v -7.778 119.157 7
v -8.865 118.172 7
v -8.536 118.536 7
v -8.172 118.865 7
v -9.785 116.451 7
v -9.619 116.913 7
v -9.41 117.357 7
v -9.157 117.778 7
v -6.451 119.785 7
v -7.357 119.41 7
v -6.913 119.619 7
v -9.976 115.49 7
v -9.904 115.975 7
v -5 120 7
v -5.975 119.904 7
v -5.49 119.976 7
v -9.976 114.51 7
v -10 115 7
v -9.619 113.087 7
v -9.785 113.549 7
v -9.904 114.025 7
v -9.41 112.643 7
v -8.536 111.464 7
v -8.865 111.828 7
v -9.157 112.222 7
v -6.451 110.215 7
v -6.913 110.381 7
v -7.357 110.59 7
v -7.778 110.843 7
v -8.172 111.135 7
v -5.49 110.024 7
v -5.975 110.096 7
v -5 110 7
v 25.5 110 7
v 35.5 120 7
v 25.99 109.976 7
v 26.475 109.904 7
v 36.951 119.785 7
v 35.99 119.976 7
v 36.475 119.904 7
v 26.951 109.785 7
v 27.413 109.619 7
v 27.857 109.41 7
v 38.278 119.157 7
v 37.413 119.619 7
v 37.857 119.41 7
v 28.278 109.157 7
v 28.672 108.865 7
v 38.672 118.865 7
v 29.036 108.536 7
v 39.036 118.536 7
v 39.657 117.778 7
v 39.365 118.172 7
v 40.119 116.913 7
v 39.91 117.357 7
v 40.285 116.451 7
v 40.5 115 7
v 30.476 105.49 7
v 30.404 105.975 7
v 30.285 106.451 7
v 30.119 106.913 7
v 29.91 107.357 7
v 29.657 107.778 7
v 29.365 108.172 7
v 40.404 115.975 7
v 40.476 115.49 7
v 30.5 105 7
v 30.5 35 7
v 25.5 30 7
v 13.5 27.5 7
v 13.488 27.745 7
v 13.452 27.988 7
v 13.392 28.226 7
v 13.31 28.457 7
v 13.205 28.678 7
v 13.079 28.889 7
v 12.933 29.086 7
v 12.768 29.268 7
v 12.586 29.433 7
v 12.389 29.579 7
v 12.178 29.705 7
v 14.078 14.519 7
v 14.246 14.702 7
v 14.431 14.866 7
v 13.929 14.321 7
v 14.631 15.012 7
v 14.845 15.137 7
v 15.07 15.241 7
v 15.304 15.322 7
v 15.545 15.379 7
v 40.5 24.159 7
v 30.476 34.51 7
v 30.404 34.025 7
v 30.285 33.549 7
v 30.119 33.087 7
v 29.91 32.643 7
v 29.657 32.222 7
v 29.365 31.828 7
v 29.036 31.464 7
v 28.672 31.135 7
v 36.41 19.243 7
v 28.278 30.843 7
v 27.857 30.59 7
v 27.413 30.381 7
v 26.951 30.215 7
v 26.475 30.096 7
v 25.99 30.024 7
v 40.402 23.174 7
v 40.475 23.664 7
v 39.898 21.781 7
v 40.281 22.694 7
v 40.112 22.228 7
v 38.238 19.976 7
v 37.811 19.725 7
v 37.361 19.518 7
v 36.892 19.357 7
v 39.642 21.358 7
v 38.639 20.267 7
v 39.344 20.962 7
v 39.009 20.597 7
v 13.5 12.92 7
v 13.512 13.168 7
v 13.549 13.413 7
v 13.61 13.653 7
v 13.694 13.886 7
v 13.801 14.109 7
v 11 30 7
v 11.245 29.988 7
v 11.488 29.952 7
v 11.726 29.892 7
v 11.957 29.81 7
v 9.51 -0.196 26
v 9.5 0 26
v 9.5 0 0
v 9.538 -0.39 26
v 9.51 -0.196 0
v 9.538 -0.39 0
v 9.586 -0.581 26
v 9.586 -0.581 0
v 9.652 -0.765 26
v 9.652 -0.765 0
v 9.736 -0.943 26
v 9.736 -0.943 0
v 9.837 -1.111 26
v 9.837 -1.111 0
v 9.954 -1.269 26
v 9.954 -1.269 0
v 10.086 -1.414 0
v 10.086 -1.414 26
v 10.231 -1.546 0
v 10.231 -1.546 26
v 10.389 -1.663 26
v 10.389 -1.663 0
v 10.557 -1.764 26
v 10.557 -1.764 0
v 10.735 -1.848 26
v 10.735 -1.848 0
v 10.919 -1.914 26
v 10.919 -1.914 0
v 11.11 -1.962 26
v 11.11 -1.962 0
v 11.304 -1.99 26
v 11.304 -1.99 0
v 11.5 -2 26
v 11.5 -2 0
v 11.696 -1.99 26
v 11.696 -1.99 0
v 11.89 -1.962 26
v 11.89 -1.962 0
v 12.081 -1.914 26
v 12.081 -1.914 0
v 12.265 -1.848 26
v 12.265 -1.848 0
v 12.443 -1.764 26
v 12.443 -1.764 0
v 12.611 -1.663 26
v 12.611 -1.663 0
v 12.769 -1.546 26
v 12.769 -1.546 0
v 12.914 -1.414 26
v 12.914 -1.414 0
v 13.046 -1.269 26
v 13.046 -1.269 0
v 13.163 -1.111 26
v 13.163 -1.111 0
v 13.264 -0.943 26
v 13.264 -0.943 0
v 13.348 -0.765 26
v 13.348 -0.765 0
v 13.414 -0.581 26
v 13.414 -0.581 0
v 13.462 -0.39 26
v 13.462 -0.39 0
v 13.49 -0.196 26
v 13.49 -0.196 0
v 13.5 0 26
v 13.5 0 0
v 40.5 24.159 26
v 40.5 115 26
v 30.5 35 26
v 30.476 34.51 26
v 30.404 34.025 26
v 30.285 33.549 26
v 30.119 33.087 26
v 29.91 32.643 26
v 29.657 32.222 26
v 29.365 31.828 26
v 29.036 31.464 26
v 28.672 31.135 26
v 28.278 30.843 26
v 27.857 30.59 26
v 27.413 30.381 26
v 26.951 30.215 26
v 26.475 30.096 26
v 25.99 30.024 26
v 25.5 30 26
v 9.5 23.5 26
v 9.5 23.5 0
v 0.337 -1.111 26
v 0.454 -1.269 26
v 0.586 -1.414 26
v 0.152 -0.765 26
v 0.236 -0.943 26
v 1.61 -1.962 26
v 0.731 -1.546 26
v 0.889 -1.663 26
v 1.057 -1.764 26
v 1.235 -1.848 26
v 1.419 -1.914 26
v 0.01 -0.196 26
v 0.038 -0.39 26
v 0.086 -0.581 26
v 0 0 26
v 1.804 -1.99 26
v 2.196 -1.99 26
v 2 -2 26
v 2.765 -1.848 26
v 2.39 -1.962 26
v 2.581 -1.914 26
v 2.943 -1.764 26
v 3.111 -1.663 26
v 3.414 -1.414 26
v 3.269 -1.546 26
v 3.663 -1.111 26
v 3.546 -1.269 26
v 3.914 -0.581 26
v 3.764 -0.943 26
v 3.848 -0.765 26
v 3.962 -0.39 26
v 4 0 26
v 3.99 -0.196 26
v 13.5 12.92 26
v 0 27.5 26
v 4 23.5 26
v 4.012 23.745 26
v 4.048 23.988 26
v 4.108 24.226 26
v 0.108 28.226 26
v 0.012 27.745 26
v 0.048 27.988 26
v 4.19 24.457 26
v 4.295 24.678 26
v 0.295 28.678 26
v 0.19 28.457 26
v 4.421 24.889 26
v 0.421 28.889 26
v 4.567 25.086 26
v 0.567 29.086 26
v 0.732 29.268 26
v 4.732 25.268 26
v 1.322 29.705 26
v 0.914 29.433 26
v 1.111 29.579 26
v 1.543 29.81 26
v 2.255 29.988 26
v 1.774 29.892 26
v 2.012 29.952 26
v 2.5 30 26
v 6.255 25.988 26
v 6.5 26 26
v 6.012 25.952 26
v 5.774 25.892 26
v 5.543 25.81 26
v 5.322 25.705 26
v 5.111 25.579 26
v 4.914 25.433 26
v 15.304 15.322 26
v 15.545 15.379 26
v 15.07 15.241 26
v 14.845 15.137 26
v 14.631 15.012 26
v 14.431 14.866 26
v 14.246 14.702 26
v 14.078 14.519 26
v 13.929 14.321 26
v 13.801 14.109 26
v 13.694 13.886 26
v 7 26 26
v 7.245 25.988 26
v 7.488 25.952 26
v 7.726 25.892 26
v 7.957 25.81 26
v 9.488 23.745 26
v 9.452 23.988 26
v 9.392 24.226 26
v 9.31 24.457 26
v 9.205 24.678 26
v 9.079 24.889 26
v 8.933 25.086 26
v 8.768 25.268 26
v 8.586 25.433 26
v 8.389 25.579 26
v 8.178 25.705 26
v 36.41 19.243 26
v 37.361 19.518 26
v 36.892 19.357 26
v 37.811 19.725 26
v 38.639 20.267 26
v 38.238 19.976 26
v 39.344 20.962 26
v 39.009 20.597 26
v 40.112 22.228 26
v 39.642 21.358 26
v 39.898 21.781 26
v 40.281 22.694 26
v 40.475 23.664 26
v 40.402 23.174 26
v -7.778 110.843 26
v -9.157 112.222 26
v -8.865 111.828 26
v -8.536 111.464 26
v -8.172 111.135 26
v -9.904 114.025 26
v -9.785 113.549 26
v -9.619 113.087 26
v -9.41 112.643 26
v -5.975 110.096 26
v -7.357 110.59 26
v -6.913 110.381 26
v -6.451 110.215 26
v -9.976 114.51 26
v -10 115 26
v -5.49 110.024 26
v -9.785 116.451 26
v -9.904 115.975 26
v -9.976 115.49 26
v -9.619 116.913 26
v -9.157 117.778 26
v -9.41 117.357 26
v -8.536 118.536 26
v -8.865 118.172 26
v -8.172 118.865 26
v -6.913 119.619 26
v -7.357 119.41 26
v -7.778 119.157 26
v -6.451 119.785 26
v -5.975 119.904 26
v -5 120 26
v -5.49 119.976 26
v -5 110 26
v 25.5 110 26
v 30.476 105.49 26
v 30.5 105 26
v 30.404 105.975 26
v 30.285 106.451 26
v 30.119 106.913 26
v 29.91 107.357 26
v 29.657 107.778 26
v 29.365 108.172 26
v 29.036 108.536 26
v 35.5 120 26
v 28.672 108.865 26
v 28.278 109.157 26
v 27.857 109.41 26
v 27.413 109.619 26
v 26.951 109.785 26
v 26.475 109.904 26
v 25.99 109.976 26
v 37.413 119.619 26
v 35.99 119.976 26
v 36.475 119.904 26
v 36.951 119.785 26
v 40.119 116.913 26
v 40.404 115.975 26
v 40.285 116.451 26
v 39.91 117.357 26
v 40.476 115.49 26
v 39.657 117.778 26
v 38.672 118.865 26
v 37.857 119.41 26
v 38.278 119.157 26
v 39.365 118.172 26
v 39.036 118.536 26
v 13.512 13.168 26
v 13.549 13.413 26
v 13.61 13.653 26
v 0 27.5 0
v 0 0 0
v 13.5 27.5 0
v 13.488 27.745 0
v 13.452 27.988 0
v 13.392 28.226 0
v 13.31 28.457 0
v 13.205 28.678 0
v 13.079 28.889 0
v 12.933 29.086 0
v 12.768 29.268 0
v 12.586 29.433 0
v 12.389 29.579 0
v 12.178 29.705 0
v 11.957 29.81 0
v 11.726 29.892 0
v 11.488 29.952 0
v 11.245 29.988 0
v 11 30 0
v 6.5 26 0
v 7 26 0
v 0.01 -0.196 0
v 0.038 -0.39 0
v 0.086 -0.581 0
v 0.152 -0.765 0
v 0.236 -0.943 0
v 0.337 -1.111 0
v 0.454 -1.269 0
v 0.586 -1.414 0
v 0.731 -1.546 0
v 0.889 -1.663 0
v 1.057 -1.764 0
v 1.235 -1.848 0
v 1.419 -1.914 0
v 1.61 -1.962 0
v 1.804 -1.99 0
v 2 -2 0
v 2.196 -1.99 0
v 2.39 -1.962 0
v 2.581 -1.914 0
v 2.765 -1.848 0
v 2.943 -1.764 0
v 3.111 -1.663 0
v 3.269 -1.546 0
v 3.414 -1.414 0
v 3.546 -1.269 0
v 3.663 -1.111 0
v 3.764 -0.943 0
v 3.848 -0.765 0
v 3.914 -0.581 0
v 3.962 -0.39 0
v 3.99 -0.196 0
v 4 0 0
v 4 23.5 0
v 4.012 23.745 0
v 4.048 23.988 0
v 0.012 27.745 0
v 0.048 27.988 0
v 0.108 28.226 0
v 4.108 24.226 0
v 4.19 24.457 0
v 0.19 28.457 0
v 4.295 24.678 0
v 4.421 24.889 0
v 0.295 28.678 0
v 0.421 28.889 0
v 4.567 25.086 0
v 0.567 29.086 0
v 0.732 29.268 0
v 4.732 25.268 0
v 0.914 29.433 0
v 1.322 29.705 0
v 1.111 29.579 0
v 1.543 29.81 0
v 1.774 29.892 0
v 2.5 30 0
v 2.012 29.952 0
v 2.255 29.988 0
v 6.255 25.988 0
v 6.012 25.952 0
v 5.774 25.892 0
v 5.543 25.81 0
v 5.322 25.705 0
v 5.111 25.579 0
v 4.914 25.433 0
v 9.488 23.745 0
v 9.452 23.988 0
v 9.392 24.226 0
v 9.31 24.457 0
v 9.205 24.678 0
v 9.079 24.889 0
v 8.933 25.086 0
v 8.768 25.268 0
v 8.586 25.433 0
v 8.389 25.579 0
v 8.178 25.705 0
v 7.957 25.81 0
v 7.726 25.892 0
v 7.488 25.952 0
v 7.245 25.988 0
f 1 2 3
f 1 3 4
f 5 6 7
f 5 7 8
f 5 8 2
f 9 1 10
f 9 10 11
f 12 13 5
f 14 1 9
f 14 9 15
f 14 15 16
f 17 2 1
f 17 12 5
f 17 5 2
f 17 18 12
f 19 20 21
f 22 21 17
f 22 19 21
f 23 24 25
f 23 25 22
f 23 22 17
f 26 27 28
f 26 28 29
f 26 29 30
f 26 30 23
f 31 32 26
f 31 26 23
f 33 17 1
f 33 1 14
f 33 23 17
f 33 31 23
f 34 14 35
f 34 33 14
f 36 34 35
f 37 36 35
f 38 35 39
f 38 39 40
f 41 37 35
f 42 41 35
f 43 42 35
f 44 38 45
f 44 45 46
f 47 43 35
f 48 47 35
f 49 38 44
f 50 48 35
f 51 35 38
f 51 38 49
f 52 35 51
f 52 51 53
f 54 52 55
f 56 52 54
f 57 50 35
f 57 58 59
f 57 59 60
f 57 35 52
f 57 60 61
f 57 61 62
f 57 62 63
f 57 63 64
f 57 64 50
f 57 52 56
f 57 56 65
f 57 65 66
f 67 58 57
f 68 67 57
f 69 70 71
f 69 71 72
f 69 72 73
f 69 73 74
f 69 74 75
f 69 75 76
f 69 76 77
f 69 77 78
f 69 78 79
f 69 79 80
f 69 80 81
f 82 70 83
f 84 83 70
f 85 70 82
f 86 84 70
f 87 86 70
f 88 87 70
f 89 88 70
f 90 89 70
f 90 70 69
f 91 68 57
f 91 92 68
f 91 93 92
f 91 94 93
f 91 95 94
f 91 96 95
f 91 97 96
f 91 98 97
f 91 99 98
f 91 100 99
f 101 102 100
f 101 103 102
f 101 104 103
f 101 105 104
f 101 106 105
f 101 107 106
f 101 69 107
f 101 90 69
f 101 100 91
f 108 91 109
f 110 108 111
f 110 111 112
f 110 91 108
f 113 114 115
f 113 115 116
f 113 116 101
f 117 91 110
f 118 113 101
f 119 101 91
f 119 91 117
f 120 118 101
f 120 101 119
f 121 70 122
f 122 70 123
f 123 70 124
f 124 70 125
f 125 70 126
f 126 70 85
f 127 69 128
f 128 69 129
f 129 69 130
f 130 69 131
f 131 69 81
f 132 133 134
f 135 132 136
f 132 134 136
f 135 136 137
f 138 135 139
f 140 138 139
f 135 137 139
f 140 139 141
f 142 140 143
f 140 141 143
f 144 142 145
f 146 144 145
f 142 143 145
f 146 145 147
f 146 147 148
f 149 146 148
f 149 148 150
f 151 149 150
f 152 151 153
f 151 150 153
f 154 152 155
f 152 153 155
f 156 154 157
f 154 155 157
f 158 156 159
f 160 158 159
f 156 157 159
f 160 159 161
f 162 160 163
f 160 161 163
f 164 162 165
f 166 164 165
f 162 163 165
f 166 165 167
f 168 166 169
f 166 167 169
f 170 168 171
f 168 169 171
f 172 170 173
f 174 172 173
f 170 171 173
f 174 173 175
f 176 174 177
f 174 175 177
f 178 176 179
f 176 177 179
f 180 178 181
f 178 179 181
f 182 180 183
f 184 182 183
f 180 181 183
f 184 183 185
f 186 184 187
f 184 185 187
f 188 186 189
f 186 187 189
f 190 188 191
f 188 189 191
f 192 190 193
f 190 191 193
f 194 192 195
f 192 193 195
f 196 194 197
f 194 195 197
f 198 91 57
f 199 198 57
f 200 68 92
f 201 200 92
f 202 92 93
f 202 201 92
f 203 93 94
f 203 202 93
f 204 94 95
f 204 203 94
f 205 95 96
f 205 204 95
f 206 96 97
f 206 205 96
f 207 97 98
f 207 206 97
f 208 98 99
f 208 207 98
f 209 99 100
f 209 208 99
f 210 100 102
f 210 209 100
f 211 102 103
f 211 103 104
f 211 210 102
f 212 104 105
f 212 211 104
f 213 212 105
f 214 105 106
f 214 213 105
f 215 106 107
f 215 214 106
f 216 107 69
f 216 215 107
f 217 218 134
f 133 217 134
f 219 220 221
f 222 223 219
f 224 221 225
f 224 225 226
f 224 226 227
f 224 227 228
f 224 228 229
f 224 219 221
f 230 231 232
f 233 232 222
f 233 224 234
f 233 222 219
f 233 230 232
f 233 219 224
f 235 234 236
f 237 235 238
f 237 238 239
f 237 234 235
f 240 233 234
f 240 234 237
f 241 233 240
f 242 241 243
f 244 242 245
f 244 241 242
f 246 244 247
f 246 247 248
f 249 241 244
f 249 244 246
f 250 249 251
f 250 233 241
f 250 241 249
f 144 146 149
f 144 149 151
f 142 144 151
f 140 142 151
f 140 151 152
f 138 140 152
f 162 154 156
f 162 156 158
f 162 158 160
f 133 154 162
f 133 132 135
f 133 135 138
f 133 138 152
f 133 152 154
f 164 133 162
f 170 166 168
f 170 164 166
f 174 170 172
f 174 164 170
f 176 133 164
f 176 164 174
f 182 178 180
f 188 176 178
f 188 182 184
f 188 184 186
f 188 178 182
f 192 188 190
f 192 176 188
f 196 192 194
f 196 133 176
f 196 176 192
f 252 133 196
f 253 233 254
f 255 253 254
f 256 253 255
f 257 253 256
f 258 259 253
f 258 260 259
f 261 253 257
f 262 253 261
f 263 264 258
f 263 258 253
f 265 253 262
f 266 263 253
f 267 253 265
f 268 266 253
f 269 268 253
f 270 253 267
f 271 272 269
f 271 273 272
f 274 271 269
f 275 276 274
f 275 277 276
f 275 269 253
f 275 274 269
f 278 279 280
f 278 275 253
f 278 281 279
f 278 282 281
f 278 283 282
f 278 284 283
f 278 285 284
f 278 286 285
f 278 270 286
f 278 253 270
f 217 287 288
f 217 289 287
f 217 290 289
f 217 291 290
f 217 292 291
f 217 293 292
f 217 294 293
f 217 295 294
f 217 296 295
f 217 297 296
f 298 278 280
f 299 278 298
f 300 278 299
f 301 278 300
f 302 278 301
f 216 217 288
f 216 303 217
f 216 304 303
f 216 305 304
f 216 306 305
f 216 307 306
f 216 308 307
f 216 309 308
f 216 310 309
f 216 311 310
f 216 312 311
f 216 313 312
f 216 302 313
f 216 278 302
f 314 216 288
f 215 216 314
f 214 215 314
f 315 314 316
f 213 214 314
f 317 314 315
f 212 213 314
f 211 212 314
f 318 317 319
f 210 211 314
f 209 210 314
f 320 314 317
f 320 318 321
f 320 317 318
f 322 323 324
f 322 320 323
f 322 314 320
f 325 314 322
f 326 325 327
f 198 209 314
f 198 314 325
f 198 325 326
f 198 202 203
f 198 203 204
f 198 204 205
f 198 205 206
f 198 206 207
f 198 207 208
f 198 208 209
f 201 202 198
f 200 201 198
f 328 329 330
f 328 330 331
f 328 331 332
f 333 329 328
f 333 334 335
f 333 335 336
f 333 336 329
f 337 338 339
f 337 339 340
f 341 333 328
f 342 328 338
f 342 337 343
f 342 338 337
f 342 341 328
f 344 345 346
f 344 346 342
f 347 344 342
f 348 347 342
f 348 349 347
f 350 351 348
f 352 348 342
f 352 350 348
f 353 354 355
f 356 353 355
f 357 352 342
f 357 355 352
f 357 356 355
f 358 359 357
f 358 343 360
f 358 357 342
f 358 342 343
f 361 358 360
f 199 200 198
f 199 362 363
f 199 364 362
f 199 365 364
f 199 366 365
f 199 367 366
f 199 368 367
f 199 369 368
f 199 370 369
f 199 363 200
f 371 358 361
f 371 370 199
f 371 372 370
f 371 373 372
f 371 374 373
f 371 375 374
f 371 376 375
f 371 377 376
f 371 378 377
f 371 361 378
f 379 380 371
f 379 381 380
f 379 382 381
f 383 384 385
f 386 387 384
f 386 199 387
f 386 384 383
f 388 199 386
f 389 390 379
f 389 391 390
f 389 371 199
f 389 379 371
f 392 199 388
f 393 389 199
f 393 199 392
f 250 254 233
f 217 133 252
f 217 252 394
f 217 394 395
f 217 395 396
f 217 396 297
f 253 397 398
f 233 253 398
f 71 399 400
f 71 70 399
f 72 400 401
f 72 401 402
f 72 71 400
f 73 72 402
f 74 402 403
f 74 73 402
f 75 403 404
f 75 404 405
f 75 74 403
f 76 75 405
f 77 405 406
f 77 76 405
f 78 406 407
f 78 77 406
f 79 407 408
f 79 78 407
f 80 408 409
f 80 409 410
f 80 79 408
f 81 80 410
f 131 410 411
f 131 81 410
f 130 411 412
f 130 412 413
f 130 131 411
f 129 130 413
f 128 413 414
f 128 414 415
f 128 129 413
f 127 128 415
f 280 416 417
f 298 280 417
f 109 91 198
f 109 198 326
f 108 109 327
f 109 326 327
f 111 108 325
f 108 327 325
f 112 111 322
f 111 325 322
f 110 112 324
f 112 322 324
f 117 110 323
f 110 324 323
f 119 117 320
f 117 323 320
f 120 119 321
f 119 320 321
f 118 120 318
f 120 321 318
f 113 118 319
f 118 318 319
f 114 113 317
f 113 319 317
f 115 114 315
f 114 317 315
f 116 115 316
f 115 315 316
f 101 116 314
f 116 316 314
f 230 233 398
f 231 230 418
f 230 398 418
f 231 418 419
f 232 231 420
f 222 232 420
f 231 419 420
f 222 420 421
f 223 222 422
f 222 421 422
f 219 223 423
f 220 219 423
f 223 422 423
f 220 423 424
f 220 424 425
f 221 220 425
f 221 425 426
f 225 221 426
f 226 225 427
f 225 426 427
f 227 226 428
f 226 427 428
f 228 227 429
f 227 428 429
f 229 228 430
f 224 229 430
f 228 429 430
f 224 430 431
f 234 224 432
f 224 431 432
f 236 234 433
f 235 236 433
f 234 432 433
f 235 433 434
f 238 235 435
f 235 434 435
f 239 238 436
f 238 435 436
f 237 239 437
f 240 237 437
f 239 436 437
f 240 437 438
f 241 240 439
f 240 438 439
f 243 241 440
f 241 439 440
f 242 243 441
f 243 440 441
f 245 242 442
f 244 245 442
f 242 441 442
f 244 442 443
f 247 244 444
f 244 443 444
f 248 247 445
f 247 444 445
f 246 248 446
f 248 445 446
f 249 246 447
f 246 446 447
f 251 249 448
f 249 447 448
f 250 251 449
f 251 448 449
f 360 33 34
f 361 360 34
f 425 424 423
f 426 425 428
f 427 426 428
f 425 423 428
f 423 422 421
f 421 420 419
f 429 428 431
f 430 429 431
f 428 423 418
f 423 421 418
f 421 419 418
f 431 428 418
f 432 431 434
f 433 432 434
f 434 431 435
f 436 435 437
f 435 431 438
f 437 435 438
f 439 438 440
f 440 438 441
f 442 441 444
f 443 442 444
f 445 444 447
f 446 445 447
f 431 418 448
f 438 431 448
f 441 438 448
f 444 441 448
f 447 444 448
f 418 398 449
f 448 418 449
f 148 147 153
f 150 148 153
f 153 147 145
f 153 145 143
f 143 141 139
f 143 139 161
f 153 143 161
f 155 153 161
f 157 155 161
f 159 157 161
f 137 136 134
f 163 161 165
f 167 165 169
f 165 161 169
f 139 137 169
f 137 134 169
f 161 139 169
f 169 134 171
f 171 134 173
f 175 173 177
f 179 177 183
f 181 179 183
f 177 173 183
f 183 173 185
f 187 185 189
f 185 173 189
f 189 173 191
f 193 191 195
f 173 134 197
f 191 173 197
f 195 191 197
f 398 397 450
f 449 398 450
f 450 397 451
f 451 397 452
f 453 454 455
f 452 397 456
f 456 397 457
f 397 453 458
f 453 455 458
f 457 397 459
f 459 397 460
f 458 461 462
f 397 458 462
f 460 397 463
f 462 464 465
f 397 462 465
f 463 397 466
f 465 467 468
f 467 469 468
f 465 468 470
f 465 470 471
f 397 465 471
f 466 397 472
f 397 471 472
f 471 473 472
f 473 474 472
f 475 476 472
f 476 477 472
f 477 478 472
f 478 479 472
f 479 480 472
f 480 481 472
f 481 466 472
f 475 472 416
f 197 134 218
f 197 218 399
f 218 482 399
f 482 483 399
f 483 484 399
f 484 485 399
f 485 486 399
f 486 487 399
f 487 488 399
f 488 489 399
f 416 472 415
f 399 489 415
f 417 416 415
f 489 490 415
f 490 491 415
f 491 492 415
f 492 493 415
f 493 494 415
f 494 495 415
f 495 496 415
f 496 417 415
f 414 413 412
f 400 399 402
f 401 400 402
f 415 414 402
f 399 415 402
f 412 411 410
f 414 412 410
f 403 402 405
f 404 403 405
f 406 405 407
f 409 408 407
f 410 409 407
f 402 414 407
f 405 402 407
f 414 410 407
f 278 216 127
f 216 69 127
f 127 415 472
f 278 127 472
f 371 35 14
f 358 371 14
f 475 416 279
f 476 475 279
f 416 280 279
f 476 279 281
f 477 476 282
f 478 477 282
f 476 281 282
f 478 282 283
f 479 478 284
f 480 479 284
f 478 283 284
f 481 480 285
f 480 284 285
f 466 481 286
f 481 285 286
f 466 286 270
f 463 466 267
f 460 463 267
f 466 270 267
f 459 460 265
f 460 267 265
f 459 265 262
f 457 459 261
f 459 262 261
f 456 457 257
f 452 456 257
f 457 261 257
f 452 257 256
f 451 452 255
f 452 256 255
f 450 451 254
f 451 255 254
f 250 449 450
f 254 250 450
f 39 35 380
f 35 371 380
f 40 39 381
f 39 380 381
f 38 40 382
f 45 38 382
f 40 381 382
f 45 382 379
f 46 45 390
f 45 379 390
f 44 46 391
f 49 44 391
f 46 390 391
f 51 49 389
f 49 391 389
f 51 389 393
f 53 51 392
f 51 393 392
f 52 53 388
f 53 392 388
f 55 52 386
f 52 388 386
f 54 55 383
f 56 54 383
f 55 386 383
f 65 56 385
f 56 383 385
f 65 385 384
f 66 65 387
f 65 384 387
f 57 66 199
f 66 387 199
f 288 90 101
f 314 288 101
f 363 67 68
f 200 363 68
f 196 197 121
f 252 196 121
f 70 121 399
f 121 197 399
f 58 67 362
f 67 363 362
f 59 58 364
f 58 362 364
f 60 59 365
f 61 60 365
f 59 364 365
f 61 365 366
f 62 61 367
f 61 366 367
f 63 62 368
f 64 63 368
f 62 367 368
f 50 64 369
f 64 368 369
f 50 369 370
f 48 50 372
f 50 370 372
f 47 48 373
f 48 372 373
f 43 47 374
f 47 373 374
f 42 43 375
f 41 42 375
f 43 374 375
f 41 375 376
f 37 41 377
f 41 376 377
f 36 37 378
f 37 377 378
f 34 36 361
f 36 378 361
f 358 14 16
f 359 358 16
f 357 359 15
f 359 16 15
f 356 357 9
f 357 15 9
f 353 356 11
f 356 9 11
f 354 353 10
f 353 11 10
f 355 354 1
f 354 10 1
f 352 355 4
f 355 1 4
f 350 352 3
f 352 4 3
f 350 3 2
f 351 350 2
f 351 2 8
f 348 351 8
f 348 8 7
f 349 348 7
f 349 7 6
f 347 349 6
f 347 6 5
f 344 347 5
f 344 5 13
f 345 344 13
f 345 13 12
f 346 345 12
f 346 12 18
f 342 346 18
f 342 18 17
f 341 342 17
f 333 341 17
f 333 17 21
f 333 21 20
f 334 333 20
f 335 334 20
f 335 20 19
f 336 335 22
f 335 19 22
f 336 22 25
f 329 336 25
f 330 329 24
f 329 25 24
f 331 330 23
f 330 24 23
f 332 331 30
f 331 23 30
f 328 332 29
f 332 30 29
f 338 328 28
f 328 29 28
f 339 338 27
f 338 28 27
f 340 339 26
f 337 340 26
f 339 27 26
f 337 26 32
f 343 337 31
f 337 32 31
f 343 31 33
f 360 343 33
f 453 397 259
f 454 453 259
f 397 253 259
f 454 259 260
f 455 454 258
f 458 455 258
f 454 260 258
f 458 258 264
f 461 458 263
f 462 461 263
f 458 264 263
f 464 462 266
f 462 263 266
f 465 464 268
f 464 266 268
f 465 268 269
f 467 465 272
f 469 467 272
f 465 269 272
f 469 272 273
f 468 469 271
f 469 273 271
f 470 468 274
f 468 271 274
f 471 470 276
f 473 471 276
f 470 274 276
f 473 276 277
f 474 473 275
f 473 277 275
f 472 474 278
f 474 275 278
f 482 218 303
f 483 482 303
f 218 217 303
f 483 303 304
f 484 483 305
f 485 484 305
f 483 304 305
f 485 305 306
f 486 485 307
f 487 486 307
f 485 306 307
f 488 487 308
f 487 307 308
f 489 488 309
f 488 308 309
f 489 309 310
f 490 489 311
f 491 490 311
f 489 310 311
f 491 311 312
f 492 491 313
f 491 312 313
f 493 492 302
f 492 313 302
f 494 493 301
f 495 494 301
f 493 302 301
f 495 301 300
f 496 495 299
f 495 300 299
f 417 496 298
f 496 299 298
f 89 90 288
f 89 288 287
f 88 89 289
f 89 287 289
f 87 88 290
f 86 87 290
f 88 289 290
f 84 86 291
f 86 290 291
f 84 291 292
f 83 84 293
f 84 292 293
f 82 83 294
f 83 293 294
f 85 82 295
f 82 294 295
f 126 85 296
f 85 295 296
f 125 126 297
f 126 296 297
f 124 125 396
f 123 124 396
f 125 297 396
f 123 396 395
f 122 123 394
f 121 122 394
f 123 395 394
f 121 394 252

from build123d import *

# Parameters (mm, degrees)
F1_DEPTH = 26
F3_DEPTH = 7
F4_R     = 5
F5_R     = 2.5


with BuildPart() as f1:
    # F0 (on Top) → F1 (new body)
    with BuildSketch(Plane.XY):
        Polygon((0, 30), (0, 0), (4, 0), (4, 26), (9.5, 26), (9.5, 0), (13.5, 0), (13.5, 15), (40.5, 20), (40.5, 120), (30.5, 120), (-5, 120), (-5, 110), (30.5, 110), (30.5, 30), align=None)
        with BuildLine():
            Line((4, 0), (0, 0))
            ThreePointArc((0, 0), (2, -2), (4, 0))
        make_face()
        with BuildLine():
            ThreePointArc((-5, 120), (-10, 115), (-5, 110))
            Line((-5, 110), (-5, 120))
        make_face()
        with BuildLine():
            Line((13.5, 0), (9.5, 0))
            ThreePointArc((9.5, 0), (11.5, -2), (13.5, 0))
        make_face()
    extrude(amount=F1_DEPTH)

    # F2 (on face) → F3 (cut)
    with BuildSketch(Plane(origin=(0, 0, 0), x_dir=(1, 0, 0), z_dir=(0, 0, -1))):
        with BuildLine():
            Line((13.5, -30), (30.5, -30))
            Line((30.5, -30), (30.5, -110))
            Line((30.5, -110), (-5, -110))
            ThreePointArc((-5, -110), (-10, -115), (-5, -120))
            Line((-5, -120), (13.5, -120))
            Line((13.5, -120), (40.5, -120))
            Line((40.5, -120), (40.5, -20))
            Line((40.5, -20), (13.5, -15))
            Line((13.5, -15), (13.5, -30))
        make_face()
    extrude(amount=-F3_DEPTH, mode=Mode.SUBTRACT)

    # F4
    f4_edges = [f1.edges().sort_by_distance(p)[0] for p in [
        (40.5, 120, 16.5),
        (30.5, 110, 16.5),
        (30.5, 30, 16.5),
        (40.5, 20, 16.5),
    ]]
    fillet(f4_edges, radius=F4_R)

    # F5
    f5_edges = [f1.edges().sort_by_distance(p)[0] for p in [
        (0, 30, 13),
        (4, 26, 13),
        (9.5, 26, 13),
        (13.5, 15, 16.5),
        (13.5, 30, 3.5),
    ]]
    fillet(f5_edges, radius=F5_R)


solid = f1.part
